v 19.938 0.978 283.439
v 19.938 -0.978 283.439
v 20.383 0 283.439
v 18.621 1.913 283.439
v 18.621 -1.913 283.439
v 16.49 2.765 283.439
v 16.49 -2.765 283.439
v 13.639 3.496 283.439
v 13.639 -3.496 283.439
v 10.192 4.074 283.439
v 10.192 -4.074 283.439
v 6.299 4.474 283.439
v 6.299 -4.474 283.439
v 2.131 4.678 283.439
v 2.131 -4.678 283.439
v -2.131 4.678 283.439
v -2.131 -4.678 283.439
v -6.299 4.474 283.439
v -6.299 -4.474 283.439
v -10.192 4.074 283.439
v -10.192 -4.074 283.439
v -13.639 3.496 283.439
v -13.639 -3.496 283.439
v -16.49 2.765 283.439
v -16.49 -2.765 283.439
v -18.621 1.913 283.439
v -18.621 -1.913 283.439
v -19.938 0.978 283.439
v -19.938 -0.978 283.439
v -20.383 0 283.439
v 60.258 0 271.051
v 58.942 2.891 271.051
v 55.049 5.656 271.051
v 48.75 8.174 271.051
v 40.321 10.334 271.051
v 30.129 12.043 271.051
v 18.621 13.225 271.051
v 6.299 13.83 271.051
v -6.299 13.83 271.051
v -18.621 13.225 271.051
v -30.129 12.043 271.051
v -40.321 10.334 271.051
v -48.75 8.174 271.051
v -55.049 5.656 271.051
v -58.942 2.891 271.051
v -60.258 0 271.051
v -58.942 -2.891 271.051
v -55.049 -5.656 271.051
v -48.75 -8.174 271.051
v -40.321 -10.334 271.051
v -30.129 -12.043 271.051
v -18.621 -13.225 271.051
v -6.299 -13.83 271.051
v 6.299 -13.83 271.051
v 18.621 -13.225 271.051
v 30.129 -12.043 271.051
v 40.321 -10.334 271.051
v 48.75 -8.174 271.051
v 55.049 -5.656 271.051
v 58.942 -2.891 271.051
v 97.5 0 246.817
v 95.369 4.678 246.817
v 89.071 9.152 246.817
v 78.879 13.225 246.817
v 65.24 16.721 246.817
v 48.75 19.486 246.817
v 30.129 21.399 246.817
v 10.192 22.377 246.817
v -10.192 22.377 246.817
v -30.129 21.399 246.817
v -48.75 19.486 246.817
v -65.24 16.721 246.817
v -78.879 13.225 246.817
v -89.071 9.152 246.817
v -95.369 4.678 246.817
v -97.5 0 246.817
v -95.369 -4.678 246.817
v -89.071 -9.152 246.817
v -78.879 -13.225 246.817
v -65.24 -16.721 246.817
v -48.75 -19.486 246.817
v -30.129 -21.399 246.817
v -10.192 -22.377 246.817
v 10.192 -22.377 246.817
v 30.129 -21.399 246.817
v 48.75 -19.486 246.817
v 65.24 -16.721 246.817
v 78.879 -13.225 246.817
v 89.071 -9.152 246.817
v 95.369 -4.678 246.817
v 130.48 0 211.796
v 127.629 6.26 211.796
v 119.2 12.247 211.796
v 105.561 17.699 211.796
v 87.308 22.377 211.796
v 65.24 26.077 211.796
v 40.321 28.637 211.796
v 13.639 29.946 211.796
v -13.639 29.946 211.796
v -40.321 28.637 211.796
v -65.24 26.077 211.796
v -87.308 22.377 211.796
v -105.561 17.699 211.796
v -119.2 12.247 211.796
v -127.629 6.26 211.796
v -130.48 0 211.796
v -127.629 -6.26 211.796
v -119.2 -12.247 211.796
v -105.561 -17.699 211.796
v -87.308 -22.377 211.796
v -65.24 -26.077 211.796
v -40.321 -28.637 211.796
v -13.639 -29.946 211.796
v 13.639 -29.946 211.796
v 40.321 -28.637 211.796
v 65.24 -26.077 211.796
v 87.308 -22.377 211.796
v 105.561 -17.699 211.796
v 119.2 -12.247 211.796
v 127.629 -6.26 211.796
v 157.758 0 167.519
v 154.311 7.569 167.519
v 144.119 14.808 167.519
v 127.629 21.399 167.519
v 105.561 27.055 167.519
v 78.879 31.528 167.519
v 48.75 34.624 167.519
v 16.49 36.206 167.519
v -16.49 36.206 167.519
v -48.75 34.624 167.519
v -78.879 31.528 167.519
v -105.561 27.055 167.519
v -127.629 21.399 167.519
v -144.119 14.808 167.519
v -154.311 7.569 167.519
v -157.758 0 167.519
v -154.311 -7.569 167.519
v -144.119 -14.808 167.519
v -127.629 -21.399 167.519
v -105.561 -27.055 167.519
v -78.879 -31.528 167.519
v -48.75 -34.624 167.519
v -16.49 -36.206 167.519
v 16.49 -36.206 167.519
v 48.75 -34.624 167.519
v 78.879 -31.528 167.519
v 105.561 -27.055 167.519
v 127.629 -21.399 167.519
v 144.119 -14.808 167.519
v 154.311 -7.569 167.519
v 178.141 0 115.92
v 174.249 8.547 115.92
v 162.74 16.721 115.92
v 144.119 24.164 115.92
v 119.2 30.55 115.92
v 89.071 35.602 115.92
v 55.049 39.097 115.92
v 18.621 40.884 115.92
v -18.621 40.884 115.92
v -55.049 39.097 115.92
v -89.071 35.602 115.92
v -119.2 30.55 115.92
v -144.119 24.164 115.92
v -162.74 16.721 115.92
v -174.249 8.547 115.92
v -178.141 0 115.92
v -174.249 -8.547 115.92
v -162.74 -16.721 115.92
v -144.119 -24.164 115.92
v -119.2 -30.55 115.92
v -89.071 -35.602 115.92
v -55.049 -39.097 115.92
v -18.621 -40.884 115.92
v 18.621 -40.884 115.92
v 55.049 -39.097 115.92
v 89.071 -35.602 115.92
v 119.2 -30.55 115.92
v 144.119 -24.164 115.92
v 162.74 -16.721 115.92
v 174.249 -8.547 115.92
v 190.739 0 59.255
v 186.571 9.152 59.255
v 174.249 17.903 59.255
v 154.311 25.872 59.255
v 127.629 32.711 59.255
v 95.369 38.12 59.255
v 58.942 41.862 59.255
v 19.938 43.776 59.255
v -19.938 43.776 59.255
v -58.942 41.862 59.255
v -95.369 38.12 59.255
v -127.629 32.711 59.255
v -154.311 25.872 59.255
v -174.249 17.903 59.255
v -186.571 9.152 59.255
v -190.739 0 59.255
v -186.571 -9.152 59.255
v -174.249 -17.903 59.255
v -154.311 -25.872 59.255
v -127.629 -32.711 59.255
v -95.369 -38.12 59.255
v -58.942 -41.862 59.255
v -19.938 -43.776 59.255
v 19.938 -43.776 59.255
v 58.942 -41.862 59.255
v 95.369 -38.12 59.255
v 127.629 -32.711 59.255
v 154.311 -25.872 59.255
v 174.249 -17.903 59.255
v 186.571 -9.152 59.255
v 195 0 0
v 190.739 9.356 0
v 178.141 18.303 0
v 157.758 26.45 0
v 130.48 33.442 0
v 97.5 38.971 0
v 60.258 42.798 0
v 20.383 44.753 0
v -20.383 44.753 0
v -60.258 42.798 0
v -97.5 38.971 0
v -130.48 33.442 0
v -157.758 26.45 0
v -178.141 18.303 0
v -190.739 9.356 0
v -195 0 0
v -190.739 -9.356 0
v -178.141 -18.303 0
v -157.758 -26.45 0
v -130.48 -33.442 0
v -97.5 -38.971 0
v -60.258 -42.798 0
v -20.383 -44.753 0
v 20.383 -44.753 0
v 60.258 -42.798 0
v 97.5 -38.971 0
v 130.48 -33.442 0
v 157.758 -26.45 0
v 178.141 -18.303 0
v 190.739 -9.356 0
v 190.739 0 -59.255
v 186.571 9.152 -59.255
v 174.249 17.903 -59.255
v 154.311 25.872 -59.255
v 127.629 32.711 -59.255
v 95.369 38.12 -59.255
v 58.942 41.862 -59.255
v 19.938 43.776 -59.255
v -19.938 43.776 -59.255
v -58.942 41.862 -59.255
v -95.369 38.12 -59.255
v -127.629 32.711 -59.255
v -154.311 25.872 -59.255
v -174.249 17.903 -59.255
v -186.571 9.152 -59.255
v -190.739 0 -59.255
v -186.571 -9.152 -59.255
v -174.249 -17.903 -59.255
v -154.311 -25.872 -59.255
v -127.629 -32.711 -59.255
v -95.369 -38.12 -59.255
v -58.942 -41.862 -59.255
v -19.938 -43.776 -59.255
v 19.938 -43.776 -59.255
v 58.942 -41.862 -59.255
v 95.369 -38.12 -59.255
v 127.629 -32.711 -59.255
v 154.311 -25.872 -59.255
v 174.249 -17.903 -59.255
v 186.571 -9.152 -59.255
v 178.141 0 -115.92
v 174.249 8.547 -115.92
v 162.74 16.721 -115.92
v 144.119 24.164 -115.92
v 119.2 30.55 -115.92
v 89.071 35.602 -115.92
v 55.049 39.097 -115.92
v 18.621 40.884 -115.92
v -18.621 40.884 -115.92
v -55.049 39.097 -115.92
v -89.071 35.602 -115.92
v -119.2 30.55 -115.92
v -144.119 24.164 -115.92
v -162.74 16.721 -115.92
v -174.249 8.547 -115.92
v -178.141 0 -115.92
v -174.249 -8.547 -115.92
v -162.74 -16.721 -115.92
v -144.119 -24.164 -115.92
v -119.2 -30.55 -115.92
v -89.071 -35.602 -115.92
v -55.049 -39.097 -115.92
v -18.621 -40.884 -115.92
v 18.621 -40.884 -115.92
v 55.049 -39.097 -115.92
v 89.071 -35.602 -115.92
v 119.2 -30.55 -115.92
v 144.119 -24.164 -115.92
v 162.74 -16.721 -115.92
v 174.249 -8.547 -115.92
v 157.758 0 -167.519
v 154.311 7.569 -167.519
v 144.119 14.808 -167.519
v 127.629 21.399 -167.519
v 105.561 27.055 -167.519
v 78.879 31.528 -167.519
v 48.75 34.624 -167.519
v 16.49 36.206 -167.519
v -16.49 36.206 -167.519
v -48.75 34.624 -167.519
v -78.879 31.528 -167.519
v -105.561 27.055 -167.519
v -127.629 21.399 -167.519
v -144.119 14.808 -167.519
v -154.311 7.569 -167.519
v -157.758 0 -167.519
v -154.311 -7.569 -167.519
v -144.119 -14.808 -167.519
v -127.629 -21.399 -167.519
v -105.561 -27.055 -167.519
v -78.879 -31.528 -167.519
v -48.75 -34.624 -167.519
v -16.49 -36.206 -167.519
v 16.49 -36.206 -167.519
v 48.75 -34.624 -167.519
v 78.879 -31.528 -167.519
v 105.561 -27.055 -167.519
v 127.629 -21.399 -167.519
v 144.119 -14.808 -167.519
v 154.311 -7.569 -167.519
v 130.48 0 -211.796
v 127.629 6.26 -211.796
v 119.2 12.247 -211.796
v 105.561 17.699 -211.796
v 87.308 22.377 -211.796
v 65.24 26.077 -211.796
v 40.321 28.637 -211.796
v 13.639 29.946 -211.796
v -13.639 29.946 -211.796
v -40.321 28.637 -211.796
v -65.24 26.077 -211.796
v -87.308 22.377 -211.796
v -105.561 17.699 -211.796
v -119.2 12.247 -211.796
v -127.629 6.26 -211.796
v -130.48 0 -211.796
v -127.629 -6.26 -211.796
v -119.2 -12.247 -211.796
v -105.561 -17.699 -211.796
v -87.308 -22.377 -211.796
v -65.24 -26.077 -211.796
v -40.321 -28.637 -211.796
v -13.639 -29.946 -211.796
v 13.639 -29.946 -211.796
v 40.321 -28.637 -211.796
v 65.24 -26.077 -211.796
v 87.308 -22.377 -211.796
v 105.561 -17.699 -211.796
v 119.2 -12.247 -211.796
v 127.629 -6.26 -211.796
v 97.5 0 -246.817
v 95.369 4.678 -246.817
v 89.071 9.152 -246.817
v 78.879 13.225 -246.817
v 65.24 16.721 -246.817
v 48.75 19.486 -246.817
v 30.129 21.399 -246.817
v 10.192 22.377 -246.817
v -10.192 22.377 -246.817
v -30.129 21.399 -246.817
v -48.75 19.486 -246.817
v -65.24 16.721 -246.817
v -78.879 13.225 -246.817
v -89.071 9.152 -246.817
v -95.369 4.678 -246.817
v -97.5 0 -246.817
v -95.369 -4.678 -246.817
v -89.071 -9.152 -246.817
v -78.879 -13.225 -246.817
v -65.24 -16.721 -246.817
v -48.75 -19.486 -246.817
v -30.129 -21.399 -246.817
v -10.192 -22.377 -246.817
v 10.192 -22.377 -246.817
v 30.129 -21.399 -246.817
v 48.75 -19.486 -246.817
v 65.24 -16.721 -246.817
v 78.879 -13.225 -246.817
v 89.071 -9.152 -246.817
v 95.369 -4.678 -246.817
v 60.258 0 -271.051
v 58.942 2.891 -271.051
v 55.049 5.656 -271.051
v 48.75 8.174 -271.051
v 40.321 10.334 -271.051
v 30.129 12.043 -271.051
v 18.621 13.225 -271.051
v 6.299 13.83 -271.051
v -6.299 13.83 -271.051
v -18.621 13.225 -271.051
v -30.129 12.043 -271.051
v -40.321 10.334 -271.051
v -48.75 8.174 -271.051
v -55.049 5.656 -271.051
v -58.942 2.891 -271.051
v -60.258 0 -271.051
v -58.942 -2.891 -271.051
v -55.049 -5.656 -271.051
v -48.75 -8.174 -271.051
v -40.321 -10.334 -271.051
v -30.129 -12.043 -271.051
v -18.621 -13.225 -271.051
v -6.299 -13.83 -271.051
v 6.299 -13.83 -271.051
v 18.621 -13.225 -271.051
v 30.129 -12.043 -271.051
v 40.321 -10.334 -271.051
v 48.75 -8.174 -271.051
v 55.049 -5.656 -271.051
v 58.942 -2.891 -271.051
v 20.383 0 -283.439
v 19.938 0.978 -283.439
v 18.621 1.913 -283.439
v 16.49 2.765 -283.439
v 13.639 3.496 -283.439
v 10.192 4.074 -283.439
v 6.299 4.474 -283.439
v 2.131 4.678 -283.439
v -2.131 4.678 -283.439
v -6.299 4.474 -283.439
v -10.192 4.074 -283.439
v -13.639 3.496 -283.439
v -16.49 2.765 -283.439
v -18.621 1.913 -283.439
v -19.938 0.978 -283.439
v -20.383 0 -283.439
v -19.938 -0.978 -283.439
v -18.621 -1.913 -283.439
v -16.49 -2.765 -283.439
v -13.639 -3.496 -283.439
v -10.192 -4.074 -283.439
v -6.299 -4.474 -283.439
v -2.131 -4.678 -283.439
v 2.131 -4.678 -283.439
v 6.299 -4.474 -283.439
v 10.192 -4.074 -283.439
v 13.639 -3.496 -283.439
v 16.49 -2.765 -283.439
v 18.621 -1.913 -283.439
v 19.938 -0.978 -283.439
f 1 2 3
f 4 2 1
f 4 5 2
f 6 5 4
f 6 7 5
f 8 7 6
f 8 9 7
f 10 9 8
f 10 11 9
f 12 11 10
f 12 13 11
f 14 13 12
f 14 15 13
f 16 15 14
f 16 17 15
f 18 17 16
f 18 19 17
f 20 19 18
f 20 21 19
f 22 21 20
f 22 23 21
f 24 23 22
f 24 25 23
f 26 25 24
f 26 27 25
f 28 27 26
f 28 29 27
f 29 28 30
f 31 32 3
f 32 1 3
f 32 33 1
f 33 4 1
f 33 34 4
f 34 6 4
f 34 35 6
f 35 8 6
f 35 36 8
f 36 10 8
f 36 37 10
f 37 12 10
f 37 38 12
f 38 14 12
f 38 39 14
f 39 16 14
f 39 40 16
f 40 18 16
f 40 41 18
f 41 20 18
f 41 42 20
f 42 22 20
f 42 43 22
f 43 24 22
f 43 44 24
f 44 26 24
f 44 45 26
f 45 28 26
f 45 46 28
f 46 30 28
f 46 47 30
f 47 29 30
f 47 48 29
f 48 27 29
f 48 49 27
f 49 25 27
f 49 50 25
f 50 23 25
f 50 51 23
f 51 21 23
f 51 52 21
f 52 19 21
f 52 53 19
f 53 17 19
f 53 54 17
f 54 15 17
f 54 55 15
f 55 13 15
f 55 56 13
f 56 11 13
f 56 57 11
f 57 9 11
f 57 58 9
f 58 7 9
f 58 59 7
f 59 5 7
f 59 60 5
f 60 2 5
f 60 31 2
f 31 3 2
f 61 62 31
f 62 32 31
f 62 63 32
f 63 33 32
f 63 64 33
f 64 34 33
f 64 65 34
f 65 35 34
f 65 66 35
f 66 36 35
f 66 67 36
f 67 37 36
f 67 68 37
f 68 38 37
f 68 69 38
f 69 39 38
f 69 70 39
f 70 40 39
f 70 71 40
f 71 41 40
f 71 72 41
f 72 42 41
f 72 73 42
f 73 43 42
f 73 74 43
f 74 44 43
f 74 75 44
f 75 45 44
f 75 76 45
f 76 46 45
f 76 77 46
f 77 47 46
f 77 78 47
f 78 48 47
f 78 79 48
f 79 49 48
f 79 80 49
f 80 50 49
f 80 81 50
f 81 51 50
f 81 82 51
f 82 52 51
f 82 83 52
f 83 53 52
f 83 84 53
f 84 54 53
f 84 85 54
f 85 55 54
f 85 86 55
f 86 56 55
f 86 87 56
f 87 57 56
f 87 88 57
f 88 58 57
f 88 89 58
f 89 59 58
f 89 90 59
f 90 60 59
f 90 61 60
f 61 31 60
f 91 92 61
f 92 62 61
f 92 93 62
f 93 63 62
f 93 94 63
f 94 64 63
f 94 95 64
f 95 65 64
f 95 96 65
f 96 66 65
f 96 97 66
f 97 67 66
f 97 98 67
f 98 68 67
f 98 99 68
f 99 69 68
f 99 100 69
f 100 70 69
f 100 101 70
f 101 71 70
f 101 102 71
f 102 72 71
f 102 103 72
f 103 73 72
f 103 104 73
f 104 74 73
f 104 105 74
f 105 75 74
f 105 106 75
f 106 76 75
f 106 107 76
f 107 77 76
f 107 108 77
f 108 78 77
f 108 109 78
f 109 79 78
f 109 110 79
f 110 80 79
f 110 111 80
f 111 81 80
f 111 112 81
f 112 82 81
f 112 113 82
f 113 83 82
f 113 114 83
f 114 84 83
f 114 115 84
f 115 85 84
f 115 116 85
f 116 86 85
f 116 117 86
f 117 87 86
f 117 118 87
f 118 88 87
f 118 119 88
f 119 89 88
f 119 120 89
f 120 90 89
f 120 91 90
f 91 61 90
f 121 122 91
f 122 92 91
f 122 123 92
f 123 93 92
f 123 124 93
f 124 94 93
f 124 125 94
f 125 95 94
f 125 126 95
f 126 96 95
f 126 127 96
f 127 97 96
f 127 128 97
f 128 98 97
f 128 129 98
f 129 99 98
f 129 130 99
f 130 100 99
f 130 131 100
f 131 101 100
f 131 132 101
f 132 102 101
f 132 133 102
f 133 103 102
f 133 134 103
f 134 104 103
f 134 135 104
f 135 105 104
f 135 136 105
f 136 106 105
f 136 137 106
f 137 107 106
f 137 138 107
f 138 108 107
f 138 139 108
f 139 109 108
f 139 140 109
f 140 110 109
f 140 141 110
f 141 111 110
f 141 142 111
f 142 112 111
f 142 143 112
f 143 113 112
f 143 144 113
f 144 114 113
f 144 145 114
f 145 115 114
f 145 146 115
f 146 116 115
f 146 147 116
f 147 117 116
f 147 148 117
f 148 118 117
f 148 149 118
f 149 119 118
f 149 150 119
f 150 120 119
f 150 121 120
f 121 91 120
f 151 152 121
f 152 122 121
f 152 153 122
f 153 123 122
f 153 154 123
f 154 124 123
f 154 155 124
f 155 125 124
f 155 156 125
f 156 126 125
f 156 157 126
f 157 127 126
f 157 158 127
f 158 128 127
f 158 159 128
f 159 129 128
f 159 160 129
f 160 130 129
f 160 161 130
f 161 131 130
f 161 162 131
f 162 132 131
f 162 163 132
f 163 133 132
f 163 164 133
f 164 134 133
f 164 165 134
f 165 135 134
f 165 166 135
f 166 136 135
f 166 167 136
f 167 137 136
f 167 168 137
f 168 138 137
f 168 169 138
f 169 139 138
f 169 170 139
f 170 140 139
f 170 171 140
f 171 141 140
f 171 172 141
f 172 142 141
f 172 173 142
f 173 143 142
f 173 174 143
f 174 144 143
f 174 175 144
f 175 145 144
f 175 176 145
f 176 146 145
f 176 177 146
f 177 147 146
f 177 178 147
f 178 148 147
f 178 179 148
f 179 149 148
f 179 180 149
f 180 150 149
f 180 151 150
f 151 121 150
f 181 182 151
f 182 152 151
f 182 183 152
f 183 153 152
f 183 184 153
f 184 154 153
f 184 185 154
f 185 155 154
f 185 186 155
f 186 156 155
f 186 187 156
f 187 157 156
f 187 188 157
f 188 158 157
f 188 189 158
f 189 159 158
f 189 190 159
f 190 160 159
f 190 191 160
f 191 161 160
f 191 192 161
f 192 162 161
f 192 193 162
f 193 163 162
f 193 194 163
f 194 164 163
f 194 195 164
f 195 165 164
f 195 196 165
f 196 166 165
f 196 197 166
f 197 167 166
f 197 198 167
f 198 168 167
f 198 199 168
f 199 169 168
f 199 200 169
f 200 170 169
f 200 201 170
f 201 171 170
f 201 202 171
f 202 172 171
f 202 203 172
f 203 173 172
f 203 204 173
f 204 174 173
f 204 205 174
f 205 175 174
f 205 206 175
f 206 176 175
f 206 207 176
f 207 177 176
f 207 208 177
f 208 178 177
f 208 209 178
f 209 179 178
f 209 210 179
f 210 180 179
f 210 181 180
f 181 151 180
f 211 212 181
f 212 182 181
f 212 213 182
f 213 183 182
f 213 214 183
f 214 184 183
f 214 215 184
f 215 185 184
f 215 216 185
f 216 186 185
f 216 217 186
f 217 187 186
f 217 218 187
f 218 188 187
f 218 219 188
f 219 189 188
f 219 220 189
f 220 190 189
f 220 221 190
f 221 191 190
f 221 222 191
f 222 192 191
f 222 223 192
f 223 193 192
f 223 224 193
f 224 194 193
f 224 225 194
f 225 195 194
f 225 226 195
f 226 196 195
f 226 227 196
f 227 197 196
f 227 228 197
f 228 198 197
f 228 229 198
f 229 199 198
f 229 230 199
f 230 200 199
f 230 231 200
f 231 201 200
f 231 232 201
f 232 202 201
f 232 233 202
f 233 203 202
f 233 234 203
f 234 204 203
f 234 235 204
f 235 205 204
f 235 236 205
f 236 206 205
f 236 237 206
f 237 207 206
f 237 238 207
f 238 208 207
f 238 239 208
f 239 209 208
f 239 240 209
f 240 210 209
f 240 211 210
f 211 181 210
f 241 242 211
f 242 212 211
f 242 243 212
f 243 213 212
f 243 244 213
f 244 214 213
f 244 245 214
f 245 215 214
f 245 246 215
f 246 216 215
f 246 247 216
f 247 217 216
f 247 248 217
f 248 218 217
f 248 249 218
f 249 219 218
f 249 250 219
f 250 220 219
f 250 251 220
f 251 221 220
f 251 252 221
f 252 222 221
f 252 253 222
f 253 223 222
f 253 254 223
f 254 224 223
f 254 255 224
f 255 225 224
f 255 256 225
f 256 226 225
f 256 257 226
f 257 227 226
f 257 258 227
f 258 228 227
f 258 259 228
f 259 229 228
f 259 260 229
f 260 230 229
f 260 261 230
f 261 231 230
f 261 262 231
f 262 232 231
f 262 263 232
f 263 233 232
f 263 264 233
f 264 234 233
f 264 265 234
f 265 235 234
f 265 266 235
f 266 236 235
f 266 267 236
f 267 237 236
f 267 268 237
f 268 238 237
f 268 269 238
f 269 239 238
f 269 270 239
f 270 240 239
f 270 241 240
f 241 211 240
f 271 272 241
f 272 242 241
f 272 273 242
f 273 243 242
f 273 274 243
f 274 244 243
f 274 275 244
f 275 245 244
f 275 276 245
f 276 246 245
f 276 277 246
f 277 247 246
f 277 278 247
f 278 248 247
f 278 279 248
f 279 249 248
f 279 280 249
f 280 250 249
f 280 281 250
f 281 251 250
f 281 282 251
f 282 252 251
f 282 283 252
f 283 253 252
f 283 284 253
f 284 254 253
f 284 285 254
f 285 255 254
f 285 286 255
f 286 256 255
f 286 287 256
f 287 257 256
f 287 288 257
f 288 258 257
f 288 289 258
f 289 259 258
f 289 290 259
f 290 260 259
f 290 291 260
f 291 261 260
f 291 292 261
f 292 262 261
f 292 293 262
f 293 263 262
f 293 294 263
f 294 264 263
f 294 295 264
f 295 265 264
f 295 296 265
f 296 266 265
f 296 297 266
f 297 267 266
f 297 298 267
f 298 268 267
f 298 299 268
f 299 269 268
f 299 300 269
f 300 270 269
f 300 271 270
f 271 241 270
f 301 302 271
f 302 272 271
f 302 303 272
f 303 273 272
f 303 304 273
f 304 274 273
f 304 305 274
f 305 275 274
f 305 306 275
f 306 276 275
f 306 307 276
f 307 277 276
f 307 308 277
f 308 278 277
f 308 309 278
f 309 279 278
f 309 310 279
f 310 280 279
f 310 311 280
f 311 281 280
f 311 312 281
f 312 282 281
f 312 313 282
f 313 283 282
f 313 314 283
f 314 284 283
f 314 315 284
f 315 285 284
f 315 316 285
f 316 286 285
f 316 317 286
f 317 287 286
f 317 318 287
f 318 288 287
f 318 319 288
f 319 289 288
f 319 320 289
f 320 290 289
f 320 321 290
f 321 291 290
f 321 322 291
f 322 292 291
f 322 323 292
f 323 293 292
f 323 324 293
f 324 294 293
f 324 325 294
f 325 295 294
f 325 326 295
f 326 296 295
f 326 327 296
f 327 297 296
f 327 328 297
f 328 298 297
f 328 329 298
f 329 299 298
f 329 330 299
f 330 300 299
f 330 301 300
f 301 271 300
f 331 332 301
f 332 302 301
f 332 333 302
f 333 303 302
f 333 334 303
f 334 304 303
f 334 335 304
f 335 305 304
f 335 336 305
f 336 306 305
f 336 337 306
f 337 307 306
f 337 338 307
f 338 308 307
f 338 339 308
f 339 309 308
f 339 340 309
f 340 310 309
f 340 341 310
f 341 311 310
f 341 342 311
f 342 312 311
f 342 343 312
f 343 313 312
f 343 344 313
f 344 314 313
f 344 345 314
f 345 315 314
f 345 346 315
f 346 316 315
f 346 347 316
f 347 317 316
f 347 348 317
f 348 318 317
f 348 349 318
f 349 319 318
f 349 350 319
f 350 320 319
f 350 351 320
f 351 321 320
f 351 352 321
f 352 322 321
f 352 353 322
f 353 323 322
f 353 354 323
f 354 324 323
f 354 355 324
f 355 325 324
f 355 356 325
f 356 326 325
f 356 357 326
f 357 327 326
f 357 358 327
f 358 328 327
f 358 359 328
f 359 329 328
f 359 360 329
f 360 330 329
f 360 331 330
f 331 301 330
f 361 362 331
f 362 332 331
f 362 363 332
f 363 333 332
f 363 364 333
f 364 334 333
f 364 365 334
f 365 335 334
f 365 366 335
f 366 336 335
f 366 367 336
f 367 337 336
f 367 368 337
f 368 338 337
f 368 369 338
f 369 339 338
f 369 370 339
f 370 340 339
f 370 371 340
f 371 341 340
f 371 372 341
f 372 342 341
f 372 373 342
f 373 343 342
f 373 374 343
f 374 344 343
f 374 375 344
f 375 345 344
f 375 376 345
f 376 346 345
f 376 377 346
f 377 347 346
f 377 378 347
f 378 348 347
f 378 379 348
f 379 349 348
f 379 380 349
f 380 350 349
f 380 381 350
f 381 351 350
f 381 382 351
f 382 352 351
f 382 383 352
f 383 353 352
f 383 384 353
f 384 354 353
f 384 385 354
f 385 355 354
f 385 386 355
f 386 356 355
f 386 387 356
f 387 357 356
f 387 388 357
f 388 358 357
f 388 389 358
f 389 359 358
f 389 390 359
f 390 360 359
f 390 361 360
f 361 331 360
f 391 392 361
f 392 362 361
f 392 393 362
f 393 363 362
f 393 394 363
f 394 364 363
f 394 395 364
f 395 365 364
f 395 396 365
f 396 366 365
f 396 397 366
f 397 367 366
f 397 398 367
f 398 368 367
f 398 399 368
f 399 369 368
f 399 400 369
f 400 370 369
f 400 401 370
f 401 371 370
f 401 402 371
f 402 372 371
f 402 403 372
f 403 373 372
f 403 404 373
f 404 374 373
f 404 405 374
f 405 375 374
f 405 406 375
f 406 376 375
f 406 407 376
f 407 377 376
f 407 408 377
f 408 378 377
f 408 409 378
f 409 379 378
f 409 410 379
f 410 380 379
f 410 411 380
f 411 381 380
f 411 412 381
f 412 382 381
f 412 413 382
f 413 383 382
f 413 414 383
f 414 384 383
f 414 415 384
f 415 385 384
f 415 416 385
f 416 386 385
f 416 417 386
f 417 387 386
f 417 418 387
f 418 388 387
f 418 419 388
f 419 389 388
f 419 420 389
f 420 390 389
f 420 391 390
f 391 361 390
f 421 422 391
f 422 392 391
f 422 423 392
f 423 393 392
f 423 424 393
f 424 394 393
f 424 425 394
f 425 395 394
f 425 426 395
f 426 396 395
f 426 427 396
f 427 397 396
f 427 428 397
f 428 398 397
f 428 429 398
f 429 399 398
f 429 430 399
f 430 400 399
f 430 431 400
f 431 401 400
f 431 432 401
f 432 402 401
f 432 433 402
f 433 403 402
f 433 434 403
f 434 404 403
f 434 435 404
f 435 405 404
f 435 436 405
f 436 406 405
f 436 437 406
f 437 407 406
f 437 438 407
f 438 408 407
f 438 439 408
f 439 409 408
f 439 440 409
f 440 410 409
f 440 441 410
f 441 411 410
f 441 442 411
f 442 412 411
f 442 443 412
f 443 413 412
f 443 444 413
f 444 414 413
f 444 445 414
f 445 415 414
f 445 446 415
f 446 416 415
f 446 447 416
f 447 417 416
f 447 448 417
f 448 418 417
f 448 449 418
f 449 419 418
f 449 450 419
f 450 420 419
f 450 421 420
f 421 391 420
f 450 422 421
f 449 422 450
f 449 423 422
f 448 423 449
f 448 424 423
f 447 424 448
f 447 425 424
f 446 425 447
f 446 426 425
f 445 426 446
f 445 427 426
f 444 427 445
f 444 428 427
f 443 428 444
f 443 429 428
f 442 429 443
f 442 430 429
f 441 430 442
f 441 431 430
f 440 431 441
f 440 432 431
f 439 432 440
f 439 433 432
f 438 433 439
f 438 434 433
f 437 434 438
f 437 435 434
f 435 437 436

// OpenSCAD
// Generated by SolidPython 1.0.1 on 2020-07-29 00:46:50


scale(v = [13, 3, 19]) {
	sphere(r = 15);
}
/***********************************************
*********      SolidPython code:      **********
************************************************
 
# import packages: SolidPython
from solid import *
from solid.utils import *
from itertools import chain, combinations, permutations


class Resize:

    def __init__(self, scad_file):
        self.scad_file = scad_file
        #self.scad_file = import_scad(scad_file)
        # cone/cylinder param:
        self.r1 = 0
        self.r2 = 0
        self.h = 0
        # rectangular prism param:
        self.w = 0
        self.l = 0
        # ellipse param:
        self.r = 0

    # import OpenScad code (file name corresponds to shape)


    # classify shape + parameters
    def assign(self, param1, param2, param3):
        if self.scad_file == 'cone.scad':
            self.r1 = param1
            self.r2 = param2
            self.h = param3
        elif self.scad_file == 'cylinder.scad':
            self.r1 = param1
            self.r2 = param2
            self.h = param3
        elif self.scad_file == 'rectangularPrism.scad':
            self.h = param1
            self.l = param2
            self.w = param3
        else:
            self.r = param1
            self.h = param2

    # resize parameters
    def iterate(self):
        x = range(3, 20, 2)
        i = 1
        if self.scad_file == 'cone.scad':
            tempList = list(permutations(x, 2))
            for temp in tempList:
                param1 = temp[0]
                param2 = temp[1]
                filepath = 'produced_scad_files/' + 'cone' + str(param1) + '_' + str(param2) + '_' + '.scad'
                scad_render_to_file(cylinder(h=param1, r1=param2, r2=0), filepath)

        elif self.scad_file == 'cylinder.scad':
            tempList = list(permutations(x, 3))
            for temp in tempList:
                param1 = temp[0]
                param2 = temp[1]
                filepath = 'produced_scad_files/' + 'cylinder' + str(param1) + '_' + str(param2) + '_' + '.scad'
                scad_render_to_file(cylinder(h=param1, r1=param2, r2=param2), filepath)

        elif self.scad_file == 'rectangularPrism.scad':
            tempList = list(permutations(x, 3))
            for temp in tempList:
                param1 = temp[0]
                param2 = temp[1]
                param3 = temp[2]
                filepath = 'produced_scad_files/' + 'rectangularPrism' + str(param1) + '_' + str(param2) + '_' + str(
                    param3) + '.scad'
                scad_render_to_file(cube(size=(param1, param2, param3)), filepath)

        elif self.scad_file == 'ellipse.scad':
            tempList = list(permutations(x, 4))
            for temp in tempList:
                param1 = temp[0]
                param2 = temp[1]
                param3 = temp[2]
                param4 = temp[3]
                filepath = 'produced_scad_files/' + 'ellipse' + str(param1) + '_' + str(param2) + '_' + str(param3) + '_' + str(param4) + '.scad'
                scad_render_to_file(scale([param1, param2, param3])(sphere(r=param4)), filepath)

    def render_to_scadfile(self):
        scad_render_to_file(scad, 'example.scad') 
 
************************************************/
